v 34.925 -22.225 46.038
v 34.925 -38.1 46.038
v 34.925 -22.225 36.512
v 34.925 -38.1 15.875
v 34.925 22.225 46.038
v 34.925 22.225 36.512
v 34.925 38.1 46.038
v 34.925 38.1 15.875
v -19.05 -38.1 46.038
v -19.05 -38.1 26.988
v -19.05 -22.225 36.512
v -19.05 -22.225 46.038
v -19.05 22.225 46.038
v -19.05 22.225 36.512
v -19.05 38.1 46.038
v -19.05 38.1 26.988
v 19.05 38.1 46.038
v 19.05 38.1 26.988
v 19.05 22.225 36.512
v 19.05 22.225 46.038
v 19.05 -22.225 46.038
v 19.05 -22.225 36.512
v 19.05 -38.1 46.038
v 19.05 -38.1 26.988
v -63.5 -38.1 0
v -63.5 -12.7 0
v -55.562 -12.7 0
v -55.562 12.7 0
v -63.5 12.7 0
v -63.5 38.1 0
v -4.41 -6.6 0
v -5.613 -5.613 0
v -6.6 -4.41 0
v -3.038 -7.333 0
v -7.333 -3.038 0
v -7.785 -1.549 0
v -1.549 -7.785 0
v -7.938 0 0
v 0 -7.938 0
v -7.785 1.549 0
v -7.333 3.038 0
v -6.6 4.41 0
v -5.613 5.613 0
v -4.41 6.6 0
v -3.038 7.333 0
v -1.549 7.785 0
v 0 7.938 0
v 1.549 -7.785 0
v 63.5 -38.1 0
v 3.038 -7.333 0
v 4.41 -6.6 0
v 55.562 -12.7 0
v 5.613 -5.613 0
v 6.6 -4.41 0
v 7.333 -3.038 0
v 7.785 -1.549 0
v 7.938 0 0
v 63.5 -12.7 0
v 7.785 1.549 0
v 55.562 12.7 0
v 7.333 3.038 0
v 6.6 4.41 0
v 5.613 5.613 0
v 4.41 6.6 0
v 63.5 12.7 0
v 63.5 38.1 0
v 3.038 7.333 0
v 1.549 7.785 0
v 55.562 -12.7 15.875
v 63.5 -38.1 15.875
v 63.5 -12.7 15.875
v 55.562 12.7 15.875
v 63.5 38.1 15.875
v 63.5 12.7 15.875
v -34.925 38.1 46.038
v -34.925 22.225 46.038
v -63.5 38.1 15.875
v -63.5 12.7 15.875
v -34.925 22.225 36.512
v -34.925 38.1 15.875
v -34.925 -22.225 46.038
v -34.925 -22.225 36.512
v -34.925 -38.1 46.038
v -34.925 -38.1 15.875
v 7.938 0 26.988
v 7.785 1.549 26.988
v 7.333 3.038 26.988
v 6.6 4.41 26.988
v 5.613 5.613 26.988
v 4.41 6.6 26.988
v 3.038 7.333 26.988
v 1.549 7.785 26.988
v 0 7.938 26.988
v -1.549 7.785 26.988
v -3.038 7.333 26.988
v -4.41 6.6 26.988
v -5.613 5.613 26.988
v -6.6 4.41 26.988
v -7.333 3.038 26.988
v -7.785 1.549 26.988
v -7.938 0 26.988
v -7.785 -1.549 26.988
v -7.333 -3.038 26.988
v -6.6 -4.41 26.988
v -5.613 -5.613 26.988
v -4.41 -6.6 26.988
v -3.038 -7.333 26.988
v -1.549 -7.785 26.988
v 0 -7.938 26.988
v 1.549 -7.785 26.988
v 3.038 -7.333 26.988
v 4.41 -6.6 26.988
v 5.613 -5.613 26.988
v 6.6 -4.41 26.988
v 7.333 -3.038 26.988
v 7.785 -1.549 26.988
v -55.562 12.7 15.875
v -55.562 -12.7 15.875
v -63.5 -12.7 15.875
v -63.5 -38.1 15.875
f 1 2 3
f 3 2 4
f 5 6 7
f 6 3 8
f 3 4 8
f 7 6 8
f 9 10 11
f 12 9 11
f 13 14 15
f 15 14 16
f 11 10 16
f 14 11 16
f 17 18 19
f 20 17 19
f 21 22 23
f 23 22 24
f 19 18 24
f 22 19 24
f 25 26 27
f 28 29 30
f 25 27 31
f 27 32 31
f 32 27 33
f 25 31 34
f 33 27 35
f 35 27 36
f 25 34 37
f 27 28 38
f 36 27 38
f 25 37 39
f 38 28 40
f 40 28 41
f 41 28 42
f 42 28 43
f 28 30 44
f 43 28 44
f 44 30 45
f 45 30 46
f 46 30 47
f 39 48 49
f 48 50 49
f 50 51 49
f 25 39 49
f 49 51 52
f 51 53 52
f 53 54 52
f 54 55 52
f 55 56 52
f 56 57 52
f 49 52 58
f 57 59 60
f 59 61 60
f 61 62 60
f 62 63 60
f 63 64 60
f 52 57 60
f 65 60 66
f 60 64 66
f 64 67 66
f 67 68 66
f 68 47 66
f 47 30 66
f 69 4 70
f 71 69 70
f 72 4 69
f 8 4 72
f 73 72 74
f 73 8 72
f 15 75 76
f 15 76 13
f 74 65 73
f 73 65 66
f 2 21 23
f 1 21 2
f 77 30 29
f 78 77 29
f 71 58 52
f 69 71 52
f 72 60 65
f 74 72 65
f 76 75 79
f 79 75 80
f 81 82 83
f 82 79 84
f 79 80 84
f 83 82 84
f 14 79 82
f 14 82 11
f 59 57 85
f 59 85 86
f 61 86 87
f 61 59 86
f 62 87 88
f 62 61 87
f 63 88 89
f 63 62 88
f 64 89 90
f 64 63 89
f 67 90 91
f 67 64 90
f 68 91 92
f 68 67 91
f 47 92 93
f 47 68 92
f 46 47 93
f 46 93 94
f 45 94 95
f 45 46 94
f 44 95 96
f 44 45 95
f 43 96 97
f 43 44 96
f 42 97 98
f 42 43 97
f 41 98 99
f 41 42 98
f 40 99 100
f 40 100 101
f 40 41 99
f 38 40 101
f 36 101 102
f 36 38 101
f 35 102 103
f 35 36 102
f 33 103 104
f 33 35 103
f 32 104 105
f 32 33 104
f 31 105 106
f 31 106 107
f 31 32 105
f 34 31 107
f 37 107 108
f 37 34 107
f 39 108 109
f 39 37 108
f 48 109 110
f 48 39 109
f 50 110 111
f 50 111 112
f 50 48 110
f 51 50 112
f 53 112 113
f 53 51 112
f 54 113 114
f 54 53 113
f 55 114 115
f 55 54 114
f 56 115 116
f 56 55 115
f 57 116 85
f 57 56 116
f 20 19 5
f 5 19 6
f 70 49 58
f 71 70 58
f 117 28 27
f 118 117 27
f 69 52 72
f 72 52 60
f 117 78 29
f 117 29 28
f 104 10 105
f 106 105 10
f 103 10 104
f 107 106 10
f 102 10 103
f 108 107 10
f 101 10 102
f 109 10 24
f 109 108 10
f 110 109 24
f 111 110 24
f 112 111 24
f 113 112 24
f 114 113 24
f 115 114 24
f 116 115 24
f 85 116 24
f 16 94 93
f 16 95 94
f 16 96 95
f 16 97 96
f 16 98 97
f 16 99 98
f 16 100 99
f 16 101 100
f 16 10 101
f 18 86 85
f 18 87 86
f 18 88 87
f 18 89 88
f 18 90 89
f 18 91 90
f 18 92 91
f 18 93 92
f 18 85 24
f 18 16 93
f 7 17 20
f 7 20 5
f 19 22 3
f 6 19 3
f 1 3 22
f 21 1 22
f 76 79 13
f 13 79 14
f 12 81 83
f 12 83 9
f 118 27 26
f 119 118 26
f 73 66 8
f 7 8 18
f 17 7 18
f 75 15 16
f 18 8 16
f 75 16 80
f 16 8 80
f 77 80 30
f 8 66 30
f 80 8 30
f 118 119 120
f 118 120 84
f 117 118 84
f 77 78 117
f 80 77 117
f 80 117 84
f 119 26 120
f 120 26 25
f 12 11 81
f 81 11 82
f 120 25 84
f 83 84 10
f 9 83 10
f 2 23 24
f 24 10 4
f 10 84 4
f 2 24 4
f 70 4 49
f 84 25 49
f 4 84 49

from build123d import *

# Parameters (mm, degrees)
F1_DEPTH = 31.75
F2_DEPTH = 92.075
F0_R     = 15.875
F3_DEPTH = 53.975
F4_DEPTH = 73.025
F5_SCALE = 0.5


with BuildPart() as f1:
    # F0 (on Top) → F1 (new body)
    with BuildSketch(Plane.XY):
        Polygon((69.8498128911, -44.4499999985), (69.85, -76.2), (127, -76.2), (127, -25.4), (111.125, -25.4), (111.1241018772, 25.4), (126.9991018772, 25.4), (126.9991018772, 76.2), (69.8491018772, 76.2), (69.8492889861, 44.45), align=None)
    extrude(amount=F1_DEPTH)

    # F0 (on Top) → F2, piece 2 (join)
    with BuildSketch(Plane.XY):
        Polygon((38.1, 76.2), (38.1, 44.4498128953), (69.8492889861, 44.45), (69.8491018772, 76.2), align=None)
        Polygon((38.1, -44.4501871063), (38.1, -76.2), (69.85, -76.2), (69.8498128911, -44.4499999985), align=None)
    extrude(amount=F2_DEPTH)



with BuildPart() as f1b:
    # F0 (on Top) → F1, piece 2 (new body)
    with BuildSketch(Plane.XY):
        Polygon((-111.125, -25.4), (-127, -25.4), (-127, -76.2), (-69.85, -76.2), (-69.8501871089, -44.45), (-69.8507110139, 44.45), (-69.8508981228, 76.2), (-127.0008981228, 76.2), (-127.0008981228, 25.4), (-111.125, 25.4), align=None)
    extrude(amount=F1_DEPTH)

    # F0 (on Top) → F2 (join)
    with BuildSketch(Plane.XY):
        Polygon((-69.8508981228, 76.2), (-69.8507110139, 44.45), (-38.1, 44.45), (-38.1, 76.2), align=None)
        Polygon((-69.8501871089, -44.45), (-69.85, -76.2), (-38.1, -76.2), (-38.1, -44.45), align=None)
    extrude(amount=F2_DEPTH)


with BuildPart() as f1_1:
    add(f1.part)

    add(f1b.part)  # F3 merges F1b
    # F0 (on Top) → F3 (join)
    with BuildSketch(Plane.XY):
        Polygon((-38.1, -44.45), (-38.1, -76.2), (0, -76.2), (38.1, -76.2), (38.1, -44.4501871063), (38.1, 44.4498128953), (38.1, 76.2), (-38.1, 76.2), (-38.1, 44.45), align=None)
        Circle(F0_R, mode=Mode.SUBTRACT)
    extrude(amount=F3_DEPTH)

    # F0 (on Top) → F4 (join)
    with BuildSketch(Plane.XY):
        Polygon((38.1, 44.4498128953), (38.1, -44.4501871063), (69.8498128911, -44.4499999985), (69.8492889861, 44.45), align=None)
        Polygon((-69.8507110139, 44.45), (-69.8501871089, -44.45), (-38.1, -44.45), (-38.1, 44.45), align=None)
    extrude(amount=F4_DEPTH)


with BuildPart() as f1_2:
    # F5: moved
    add(f1_1.part.scale(F5_SCALE))


solid = f1_2.part
